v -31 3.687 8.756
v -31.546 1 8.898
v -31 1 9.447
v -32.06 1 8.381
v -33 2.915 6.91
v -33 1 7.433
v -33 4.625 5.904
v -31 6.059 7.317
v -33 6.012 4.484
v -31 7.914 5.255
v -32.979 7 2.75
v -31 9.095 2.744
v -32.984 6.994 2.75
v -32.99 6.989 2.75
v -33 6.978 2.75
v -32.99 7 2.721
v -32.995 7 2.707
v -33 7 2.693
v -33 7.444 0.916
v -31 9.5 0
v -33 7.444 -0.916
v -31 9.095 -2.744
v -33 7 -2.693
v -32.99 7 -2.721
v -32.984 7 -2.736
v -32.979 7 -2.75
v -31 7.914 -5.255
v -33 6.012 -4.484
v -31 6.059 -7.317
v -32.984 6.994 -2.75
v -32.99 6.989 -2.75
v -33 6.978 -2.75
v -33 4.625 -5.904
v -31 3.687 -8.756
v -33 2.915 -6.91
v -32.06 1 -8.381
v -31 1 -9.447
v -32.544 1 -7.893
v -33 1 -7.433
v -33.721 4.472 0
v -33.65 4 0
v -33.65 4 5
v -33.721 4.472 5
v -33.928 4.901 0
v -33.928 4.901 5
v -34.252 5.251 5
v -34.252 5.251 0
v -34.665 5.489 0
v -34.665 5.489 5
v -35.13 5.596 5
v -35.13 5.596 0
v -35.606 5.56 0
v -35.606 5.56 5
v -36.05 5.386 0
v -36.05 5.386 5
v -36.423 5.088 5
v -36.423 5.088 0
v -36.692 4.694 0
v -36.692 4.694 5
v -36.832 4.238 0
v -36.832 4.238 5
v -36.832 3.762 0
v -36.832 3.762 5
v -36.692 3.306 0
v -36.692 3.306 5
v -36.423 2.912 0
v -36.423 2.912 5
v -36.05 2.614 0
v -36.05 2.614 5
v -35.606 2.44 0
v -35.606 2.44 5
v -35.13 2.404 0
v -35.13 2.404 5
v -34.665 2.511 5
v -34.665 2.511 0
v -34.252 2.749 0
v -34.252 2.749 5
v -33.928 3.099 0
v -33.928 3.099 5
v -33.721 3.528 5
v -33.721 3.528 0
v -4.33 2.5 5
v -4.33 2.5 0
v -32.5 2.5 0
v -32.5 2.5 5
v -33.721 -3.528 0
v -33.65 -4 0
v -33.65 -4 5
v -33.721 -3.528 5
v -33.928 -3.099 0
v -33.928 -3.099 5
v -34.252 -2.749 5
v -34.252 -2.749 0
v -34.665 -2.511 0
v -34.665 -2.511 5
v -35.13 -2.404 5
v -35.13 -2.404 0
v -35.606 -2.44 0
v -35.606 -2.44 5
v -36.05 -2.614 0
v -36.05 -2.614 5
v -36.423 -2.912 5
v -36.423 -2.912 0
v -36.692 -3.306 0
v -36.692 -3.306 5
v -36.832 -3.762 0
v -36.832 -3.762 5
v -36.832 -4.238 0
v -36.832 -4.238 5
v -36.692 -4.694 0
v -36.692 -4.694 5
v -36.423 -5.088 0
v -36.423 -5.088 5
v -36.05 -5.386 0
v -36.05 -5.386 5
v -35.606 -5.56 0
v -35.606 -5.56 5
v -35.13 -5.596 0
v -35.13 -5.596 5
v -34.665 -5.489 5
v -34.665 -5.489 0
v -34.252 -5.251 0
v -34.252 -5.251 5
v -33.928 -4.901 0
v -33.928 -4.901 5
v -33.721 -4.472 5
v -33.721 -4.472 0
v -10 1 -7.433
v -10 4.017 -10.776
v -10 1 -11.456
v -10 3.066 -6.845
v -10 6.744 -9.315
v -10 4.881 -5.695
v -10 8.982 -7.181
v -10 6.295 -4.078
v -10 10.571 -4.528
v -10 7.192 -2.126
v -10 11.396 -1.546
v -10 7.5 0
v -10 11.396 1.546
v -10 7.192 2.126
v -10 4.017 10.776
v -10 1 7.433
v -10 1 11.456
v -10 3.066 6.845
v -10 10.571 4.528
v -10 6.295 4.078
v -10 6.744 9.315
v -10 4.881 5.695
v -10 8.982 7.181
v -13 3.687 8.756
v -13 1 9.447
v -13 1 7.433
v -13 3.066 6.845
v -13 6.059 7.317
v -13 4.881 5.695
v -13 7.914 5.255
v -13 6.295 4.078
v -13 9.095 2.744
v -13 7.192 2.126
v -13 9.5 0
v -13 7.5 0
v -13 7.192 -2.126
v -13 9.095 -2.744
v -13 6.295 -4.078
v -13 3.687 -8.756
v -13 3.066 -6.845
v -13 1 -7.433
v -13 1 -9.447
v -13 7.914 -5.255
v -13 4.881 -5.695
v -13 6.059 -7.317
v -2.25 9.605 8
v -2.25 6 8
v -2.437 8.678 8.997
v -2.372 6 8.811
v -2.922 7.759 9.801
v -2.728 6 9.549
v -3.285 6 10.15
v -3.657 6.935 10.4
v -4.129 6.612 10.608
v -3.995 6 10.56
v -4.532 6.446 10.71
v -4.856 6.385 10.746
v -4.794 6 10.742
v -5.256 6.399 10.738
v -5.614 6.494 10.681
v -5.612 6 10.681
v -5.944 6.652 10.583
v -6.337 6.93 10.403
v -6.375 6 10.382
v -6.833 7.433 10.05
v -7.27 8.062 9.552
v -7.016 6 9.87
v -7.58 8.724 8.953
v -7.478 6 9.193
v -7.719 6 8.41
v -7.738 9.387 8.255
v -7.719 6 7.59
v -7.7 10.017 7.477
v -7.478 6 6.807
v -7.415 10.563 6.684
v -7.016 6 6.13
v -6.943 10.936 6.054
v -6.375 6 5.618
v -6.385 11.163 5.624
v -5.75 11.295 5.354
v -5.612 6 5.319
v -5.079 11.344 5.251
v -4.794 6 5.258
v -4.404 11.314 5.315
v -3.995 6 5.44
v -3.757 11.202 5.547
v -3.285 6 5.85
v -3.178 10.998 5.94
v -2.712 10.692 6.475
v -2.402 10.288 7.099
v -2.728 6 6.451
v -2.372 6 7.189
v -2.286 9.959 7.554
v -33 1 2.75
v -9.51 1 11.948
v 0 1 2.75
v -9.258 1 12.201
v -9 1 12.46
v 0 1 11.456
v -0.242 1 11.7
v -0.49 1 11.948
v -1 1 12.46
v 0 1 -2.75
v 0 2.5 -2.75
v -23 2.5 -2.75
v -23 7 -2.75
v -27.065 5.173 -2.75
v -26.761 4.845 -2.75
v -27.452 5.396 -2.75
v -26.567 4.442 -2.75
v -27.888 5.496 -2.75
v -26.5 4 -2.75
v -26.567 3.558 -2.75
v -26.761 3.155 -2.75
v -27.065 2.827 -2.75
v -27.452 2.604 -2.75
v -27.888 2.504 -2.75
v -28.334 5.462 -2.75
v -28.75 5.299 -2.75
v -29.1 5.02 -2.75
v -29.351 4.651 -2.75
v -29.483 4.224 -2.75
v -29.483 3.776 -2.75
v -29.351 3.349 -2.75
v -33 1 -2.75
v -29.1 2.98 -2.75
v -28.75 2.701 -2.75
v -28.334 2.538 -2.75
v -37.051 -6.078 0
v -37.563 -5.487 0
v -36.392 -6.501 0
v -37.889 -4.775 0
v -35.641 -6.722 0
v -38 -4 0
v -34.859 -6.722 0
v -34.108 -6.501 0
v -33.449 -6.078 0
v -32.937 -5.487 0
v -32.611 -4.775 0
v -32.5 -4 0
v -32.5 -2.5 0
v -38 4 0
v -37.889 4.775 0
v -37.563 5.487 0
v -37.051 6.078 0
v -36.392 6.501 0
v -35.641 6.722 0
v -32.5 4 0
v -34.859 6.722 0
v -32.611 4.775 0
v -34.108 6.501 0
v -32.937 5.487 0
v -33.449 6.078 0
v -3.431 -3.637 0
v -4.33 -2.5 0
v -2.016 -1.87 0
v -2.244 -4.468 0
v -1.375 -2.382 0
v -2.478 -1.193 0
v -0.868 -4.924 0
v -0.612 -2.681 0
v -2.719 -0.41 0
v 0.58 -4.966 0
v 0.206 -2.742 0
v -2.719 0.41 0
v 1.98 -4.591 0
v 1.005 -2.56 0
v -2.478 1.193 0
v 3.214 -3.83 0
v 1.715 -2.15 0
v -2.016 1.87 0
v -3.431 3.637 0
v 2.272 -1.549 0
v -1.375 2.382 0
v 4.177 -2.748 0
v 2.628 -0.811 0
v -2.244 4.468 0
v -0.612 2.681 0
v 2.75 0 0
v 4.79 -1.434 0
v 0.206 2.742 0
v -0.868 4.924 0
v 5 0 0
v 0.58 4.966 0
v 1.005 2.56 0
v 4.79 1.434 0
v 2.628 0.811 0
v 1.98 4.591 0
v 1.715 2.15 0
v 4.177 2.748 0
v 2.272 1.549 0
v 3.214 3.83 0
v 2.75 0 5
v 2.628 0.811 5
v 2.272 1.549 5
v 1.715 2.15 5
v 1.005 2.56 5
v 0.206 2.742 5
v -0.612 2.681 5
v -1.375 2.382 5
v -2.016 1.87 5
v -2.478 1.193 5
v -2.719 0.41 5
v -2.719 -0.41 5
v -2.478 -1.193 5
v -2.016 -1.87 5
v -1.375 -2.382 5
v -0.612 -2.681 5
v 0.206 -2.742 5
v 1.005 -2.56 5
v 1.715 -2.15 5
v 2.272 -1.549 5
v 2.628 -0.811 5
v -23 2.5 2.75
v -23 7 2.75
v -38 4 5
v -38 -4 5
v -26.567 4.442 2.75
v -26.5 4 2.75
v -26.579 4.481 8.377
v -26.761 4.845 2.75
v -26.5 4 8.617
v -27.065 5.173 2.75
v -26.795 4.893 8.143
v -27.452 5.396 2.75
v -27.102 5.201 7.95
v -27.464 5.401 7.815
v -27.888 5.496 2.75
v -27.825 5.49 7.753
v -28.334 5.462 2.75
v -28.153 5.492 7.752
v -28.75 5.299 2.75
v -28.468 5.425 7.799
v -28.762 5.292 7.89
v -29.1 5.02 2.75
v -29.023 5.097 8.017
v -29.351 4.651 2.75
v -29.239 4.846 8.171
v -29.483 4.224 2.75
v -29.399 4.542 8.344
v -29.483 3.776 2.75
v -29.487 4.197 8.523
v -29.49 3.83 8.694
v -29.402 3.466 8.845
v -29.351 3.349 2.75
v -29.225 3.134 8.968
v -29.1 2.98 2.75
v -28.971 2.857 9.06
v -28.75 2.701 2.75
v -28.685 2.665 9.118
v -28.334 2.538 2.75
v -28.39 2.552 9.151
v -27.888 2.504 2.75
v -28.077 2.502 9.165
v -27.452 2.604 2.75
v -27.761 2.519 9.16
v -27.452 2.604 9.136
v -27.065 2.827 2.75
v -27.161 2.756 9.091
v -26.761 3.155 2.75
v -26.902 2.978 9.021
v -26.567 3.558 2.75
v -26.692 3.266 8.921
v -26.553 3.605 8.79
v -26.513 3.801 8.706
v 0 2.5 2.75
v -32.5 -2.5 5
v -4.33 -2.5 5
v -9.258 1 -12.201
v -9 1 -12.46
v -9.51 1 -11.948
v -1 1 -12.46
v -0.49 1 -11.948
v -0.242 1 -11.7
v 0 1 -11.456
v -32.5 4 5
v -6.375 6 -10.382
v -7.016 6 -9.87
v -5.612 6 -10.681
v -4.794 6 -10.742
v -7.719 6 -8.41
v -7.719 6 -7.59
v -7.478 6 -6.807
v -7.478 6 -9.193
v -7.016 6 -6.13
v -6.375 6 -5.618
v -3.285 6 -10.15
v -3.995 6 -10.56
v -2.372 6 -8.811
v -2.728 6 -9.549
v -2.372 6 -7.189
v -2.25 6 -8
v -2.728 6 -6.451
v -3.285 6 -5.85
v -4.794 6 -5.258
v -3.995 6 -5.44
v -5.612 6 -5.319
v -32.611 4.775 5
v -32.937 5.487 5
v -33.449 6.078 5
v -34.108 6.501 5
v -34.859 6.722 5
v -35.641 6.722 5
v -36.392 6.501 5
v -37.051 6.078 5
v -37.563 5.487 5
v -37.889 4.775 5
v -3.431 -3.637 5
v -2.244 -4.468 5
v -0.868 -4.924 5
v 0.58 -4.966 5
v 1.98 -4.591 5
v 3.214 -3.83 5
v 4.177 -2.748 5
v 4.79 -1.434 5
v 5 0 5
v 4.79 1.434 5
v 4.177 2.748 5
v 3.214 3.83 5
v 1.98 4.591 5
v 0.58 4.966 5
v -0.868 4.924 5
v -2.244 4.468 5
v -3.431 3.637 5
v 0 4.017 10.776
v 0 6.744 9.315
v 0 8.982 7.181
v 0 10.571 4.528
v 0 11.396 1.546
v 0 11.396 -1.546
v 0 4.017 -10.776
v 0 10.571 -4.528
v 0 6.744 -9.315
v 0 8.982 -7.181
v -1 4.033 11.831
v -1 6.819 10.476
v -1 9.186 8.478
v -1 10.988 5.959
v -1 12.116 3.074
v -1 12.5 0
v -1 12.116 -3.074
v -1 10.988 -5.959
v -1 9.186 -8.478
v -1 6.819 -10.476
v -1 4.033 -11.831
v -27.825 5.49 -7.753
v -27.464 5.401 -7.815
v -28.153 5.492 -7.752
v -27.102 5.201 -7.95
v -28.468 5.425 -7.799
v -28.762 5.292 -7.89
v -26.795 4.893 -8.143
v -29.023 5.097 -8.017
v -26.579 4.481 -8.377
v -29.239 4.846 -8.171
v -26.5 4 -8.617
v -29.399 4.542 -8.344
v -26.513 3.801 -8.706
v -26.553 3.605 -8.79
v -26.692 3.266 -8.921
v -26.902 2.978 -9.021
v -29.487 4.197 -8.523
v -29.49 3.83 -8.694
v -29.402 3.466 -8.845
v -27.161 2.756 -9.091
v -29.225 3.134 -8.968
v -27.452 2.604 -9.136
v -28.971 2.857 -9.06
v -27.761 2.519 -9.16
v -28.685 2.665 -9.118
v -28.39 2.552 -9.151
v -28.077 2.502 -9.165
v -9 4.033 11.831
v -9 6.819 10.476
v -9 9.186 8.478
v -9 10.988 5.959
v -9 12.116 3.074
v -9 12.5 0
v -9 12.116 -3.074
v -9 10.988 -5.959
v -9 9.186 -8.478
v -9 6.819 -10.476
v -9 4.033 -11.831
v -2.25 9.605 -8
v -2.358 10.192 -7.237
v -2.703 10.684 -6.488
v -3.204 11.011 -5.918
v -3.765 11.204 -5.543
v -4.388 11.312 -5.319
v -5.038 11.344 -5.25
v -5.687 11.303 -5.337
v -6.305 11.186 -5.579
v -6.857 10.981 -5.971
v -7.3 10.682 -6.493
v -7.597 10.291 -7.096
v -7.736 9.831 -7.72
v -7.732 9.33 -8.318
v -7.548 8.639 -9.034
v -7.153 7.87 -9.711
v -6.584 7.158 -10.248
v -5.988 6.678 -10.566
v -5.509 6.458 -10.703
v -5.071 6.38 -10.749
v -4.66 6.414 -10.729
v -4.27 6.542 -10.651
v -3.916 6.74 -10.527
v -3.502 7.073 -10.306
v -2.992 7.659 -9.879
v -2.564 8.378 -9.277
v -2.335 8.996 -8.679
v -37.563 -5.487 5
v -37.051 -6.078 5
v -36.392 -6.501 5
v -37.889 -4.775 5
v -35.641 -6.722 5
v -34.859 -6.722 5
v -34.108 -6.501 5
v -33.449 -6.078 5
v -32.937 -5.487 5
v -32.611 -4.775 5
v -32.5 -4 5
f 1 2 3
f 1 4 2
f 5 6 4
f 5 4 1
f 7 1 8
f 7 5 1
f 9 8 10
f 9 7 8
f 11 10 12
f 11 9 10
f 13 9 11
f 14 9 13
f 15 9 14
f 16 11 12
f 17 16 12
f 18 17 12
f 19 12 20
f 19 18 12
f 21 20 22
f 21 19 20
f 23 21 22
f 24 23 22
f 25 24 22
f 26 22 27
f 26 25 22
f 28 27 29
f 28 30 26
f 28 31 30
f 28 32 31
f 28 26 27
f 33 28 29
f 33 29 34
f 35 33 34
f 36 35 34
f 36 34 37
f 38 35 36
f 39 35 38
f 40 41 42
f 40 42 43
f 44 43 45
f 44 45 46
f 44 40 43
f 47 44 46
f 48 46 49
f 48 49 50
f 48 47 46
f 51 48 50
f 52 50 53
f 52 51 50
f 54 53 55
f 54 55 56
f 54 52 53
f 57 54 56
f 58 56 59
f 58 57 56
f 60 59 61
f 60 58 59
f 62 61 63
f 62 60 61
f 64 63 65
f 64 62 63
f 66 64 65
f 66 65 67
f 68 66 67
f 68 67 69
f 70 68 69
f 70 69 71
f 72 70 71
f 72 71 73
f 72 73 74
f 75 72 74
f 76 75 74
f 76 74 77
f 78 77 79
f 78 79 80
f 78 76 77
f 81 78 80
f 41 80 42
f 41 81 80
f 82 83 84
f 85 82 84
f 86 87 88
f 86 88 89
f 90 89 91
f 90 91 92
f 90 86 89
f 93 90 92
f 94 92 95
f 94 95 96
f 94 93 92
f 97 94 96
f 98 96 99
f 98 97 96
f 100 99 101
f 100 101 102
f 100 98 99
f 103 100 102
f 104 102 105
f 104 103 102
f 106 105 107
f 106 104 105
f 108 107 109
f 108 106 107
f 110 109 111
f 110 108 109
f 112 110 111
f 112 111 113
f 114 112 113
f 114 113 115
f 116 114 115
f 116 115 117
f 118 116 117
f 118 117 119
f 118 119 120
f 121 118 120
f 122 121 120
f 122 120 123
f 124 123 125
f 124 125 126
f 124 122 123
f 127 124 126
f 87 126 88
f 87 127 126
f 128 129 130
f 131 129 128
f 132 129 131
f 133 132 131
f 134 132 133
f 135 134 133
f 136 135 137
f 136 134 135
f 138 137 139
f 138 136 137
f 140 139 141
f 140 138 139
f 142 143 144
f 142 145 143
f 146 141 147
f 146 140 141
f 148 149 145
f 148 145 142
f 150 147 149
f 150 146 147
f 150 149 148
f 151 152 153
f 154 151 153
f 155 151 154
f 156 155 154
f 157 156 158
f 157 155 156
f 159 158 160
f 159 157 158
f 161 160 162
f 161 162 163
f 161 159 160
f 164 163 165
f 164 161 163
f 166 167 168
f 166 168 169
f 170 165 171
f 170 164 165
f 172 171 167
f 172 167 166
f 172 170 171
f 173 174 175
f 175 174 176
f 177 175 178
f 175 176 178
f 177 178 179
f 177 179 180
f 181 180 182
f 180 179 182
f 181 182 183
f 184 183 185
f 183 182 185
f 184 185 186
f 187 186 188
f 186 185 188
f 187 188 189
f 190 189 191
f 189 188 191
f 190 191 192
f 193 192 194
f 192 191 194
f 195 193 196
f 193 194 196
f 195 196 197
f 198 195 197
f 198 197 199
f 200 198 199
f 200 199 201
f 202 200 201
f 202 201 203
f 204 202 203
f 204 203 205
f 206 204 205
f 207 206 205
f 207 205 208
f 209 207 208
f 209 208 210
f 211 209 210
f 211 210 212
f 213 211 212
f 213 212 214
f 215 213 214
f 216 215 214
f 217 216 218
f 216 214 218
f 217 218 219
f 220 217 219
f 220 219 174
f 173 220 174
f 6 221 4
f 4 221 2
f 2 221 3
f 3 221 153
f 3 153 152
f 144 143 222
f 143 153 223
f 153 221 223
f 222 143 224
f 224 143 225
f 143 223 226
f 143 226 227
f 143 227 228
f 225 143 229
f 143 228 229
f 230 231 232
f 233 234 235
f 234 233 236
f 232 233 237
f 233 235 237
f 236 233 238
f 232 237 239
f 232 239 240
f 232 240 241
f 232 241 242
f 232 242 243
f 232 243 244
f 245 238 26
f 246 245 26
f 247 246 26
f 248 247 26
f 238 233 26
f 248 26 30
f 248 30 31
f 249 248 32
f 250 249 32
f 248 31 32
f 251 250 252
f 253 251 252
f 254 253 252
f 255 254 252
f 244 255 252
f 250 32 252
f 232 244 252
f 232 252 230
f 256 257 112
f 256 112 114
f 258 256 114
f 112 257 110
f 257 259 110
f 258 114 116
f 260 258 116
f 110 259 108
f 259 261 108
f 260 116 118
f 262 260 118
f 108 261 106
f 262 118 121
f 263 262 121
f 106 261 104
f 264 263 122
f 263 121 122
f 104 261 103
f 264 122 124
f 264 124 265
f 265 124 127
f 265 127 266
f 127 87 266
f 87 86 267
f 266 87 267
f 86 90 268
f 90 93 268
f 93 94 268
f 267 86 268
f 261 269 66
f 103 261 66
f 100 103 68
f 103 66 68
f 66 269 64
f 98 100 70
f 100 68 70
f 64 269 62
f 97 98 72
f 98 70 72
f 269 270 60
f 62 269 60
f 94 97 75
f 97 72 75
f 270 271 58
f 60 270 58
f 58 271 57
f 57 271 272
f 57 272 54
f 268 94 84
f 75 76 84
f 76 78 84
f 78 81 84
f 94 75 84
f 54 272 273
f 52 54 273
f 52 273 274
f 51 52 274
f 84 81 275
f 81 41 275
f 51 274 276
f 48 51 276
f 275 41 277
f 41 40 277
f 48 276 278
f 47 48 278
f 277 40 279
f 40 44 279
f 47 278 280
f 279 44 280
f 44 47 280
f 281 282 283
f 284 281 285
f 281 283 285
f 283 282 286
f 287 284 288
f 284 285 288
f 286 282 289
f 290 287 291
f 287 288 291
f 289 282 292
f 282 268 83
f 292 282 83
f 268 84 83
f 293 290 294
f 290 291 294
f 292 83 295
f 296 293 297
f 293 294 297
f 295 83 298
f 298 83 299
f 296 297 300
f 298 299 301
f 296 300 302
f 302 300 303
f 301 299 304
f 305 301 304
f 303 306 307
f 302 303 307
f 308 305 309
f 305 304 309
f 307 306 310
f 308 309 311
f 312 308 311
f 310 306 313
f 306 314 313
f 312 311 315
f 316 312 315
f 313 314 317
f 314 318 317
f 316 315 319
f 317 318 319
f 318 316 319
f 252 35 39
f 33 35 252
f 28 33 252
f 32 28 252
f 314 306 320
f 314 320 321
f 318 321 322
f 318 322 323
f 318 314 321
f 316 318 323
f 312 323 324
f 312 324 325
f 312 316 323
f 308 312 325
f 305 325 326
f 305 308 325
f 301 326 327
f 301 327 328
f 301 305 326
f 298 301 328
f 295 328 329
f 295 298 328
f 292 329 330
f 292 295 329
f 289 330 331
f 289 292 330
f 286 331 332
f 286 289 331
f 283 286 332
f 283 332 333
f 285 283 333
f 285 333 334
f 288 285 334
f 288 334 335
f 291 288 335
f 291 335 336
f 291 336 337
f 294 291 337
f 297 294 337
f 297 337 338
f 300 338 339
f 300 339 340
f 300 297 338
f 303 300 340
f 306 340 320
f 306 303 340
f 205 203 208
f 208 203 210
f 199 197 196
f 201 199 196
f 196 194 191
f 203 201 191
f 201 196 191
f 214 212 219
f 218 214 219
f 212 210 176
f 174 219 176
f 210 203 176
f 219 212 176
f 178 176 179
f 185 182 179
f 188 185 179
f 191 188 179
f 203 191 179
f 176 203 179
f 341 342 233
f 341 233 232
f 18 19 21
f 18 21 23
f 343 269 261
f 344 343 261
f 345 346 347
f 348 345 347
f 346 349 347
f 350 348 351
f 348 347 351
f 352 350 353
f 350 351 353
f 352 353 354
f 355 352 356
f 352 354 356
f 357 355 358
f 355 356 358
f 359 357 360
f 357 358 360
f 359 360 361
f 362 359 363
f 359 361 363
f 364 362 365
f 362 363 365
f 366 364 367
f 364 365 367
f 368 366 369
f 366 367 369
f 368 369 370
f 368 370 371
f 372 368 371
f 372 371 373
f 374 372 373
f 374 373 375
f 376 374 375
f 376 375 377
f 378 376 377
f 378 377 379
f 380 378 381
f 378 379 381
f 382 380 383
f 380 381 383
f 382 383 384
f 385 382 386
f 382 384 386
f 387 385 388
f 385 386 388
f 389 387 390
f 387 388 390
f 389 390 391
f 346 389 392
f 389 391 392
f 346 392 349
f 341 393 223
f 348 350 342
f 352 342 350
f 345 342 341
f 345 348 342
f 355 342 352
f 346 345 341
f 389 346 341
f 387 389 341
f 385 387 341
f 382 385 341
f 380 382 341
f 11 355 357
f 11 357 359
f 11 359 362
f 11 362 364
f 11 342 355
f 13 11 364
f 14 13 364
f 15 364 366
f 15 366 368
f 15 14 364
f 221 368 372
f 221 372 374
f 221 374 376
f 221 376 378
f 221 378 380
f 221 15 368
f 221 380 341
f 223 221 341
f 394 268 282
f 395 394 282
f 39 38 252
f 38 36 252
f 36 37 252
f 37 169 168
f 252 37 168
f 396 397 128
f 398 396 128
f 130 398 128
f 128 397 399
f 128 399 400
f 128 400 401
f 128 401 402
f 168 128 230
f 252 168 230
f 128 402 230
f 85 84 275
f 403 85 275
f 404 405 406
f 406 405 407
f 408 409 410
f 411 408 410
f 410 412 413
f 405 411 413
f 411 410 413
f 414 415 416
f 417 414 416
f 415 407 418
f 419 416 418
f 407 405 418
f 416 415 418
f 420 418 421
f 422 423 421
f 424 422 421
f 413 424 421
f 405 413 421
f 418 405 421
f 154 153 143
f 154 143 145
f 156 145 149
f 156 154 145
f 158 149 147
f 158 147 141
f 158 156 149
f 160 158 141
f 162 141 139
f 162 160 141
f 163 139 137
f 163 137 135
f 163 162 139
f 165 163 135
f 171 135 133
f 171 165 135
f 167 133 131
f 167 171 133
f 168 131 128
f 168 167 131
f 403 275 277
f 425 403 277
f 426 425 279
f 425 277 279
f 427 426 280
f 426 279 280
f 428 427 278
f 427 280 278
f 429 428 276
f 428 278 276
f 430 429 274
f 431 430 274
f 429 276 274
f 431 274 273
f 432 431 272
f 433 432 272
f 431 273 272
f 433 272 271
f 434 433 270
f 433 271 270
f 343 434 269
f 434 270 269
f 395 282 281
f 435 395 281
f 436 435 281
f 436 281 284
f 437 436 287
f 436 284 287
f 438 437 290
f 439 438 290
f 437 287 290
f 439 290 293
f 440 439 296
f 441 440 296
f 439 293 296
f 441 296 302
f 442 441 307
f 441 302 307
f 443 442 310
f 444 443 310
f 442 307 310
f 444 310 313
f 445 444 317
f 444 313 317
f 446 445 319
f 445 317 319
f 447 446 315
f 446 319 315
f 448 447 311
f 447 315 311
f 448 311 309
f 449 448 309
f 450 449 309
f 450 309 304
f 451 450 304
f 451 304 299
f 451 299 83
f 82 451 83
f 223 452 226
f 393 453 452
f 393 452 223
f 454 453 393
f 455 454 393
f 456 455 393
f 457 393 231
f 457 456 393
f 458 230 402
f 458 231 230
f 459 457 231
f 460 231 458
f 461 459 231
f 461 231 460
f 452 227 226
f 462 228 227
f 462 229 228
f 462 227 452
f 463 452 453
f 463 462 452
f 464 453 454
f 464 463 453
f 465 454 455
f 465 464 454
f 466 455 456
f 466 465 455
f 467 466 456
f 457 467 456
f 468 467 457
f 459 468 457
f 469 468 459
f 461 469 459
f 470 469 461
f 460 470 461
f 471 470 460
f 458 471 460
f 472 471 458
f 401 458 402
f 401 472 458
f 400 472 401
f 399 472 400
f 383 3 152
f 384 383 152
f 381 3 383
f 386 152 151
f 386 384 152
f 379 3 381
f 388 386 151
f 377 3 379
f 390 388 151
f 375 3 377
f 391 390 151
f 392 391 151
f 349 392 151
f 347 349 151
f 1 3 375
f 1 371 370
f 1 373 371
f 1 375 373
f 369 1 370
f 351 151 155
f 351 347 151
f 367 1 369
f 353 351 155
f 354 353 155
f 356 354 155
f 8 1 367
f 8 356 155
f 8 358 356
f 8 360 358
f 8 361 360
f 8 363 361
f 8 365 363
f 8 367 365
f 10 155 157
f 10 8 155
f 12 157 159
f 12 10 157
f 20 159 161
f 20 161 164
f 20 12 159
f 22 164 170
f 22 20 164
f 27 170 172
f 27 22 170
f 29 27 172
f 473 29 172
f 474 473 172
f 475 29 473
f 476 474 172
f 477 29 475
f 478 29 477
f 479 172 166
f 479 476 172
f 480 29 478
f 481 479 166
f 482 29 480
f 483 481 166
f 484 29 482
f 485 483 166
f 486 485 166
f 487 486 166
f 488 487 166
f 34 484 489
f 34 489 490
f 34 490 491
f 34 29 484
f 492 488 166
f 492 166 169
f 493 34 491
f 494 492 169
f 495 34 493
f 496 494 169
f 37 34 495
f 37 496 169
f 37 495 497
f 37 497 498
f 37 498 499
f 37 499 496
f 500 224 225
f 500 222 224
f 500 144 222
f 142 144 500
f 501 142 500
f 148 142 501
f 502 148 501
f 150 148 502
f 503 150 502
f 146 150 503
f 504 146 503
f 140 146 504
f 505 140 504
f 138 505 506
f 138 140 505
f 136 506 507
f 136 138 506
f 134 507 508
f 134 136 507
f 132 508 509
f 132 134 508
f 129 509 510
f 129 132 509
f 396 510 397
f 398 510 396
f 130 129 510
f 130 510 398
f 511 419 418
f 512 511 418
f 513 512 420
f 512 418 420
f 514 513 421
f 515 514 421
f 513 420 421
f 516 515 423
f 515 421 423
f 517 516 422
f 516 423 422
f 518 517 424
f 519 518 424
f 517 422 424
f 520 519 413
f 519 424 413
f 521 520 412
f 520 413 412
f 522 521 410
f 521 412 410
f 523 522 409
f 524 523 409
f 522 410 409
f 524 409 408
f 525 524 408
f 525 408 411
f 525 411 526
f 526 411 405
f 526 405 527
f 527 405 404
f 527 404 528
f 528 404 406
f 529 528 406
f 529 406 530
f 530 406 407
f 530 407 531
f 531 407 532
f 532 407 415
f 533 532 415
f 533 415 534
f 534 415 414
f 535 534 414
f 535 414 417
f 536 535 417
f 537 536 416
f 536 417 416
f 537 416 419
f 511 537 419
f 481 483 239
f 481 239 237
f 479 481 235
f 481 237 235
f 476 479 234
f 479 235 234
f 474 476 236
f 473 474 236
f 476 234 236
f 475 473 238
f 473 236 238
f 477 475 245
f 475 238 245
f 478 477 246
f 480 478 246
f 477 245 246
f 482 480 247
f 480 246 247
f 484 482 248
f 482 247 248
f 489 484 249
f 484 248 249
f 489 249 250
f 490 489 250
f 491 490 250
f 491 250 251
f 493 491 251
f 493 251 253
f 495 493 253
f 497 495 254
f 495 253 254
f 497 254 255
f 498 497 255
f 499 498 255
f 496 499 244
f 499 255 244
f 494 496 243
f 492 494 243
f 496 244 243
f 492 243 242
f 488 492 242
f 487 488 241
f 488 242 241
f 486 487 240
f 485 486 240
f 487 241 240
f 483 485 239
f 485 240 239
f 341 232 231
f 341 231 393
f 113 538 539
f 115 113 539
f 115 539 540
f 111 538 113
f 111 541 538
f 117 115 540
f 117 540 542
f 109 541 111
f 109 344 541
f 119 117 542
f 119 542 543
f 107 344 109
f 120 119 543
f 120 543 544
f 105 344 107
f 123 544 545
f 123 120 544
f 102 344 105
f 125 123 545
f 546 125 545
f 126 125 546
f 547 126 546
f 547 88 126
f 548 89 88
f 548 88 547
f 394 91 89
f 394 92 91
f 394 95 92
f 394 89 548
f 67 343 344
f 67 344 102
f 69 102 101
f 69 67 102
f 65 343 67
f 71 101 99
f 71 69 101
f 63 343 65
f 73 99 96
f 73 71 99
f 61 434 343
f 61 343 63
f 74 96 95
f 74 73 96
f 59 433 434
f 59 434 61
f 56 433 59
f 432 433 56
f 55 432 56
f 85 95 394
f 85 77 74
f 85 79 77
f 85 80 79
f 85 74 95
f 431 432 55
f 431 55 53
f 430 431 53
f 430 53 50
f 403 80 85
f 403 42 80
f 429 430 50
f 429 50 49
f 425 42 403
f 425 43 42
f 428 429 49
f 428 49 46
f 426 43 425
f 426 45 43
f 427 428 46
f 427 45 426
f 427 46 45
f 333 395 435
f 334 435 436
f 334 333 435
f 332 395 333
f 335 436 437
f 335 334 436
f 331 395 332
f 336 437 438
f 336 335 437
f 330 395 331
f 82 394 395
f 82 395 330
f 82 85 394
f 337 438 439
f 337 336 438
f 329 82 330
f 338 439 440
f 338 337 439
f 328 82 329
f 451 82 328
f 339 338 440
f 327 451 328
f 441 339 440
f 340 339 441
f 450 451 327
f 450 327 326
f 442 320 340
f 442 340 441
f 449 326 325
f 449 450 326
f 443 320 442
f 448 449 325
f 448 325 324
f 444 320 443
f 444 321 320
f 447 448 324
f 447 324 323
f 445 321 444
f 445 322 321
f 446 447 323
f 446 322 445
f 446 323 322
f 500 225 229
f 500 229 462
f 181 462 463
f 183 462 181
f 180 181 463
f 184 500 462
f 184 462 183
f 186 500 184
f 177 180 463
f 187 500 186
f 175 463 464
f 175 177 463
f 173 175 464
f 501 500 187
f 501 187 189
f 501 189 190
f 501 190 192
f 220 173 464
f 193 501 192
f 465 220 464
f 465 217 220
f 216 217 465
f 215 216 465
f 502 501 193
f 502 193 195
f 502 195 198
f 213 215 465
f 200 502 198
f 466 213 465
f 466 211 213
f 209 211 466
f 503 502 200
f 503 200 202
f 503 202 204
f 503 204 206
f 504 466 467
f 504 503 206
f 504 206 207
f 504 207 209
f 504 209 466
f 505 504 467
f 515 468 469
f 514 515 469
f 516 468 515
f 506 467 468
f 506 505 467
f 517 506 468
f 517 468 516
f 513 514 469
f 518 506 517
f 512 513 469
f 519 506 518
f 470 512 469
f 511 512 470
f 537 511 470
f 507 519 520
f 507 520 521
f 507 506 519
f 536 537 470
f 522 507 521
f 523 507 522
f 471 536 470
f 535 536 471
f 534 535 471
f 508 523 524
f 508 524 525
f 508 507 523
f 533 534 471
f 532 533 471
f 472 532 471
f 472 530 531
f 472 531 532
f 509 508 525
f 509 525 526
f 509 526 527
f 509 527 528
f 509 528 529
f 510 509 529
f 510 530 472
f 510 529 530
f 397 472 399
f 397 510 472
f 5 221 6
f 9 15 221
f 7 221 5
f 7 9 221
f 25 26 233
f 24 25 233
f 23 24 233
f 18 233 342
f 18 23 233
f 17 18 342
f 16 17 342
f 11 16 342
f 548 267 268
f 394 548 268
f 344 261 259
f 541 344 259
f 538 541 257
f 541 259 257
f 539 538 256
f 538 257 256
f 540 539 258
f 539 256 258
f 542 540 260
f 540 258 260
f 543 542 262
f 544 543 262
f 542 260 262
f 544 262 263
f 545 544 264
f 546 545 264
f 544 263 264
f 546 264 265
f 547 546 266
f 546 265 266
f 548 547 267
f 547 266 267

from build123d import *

# Parameters (mm, degrees)
F1_ANGLE    = 180
F3_DEPTH    = 33.001
F4_W        = 6
F4_H        = 5.5
F5_DEPTH    = 10
F6_W        = 1.5
F6_H        = 5.5
F7_DEPTH    = 23.001
F8_T2_ANGLE = 230.0428222626
F9_R        = 1.5
F10_DEPTH   = 12.5
F11_R       = 1.6
F11_R_2     = 2.75
F12_DEPTH   = 5
F13_SIZE    = 1
F15_R       = 2.75
F16_DEPTH   = 5.3450514045


# Not quite as in the source:
# - a fillet or chamfer that OpenCascade refuses, or shapes differently, is made with other operations: its cross-section is extruded or revolved along the edge and cut away or added


with BuildPart() as f1:
    # F0 (on Front) → F1 (revolve)
    with BuildSketch(Plane.XZ):
        Polygon((-33, 0), (0, 0), (0, 12.5), (-10, 12.5), (-10, 7.5), (-13, 7.5), (-13, 9.5), (-33, 9.5), align=None)
    revolve(axis=Axis((-16.5, 0, 0), (-1, 0, 0)), revolution_arc=F1_ANGLE)

    # F2 (on face) → F3 (cut, through all)
    with BuildSketch(Plane.YZ):
        with BuildLine():
            ThreePointArc((1, 12.4599357944), (0.5004011242, 12.4899799325), (0, 12.5))
            Line((0, 12.5), (0, -12.5))
            ThreePointArc((0, -12.5), (0.5004011242, -12.4899799325), (1, -12.4599357944))
            Line((1, -12.4599357944), (1, 12.4599357944))
        make_face()
        with BuildLine():
            ThreePointArc((1, -12.4599357944), (0.5004011242, -12.4899799325), (0, -12.5))
            Line((0, -12.5), (0, -17.5))
            Line((0, -17.5), (1, -17.5))
            Line((1, -17.5), (1, -12.4599357944))
        make_face()
    extrude(amount=-F3_DEPTH, mode=Mode.SUBTRACT)

    # F4 (on face) → F5 (cut)
    with BuildSketch(Plane(origin=(-33, 0, 0), x_dir=(0, -1, 0), z_dir=(-1, 0, 0))):
        with Locations((-4, 0)):
            Rectangle(F4_W, F4_H)
    extrude(amount=-F5_DEPTH, mode=Mode.SUBTRACT)

    # F6 (on face) → F7 (cut, through all)
    with BuildSketch(Plane(origin=(-23, 0, 0), x_dir=(0, -1, 0), z_dir=(-1, 0, 0))):
        with Locations((-1.75, 0)):
            Rectangle(F6_W, F6_H)
    extrude(amount=-F7_DEPTH, mode=Mode.SUBTRACT)

    # F8: chamfer of 2 on 1 edges, made by hand

    # F8_s1 → F8_t2 (revolve, cut)
    with BuildSketch(Plane(origin=(0, 0, 0), x_dir=(1, 0, 0), z_dir=(0, -0.9061497935, -0.4229569147))):
        Polygon((-31, 9.5), (-33, 7.5), (-33, 9.5), align=None)
    revolve(axis=Axis((-33, 0, 0), (-1, 0, 0)), revolution_arc=F8_T2_ANGLE, mode=Mode.SUBTRACT)

    # F9 (on Top) → F10 (cut, symmetric)
    with BuildSketch(Plane.XY):
        with Locations((-28, 4)):
            Circle(F9_R)
    extrude(amount=F10_DEPTH, both=True, mode=Mode.SUBTRACT)

    # F13
    f13_edges = [f1.edges().sort_by_distance(p)[0] for p in [
        (-10, 12.5, 0),
        (0, 12.5, 0),
    ]]
    chamfer(f13_edges, length=F13_SIZE)

    # F15 (on offset) → F16 (cut, through all)
    with BuildSketch(Plane.XZ.offset(-6)):
        with Locations((-5, -8)):
            Circle(F15_R)
        with Locations((-5, 8)):
            Circle(F15_R)
    extrude(amount=-F16_DEPTH, mode=Mode.SUBTRACT)


with BuildPart() as f12:
    # F11 (on Top) → F12 (new body)
    with BuildSketch(Plane.XY):
        with BuildLine():
            Line((-32.5, -2.5), (-4.3301270189, -2.5))
            ThreePointArc((-4.3301270189, -2.5), (5, 0), (-4.3301270189, 2.5))
            Line((-4.3301270189, 2.5), (-32.5, 2.5))
            Line((-32.5, 2.5), (-32.5, 4))
            ThreePointArc((-32.5, 4), (-35.25, 6.75), (-38, 4))
            Line((-38, 4), (-38, -4))
            ThreePointArc((-38, -4), (-35.25, -6.75), (-32.5, -4))
            Line((-32.5, -4), (-32.5, -2.5))
        make_face()
        with Locations((-35.25, -4)):
            Circle(F11_R, mode=Mode.SUBTRACT)
        with Locations((-35.25, 4)):
            Circle(F11_R, mode=Mode.SUBTRACT)
        Circle(F11_R_2, mode=Mode.SUBTRACT)
    extrude(amount=F12_DEPTH)


solid = Compound([f1.part, f12.part])
